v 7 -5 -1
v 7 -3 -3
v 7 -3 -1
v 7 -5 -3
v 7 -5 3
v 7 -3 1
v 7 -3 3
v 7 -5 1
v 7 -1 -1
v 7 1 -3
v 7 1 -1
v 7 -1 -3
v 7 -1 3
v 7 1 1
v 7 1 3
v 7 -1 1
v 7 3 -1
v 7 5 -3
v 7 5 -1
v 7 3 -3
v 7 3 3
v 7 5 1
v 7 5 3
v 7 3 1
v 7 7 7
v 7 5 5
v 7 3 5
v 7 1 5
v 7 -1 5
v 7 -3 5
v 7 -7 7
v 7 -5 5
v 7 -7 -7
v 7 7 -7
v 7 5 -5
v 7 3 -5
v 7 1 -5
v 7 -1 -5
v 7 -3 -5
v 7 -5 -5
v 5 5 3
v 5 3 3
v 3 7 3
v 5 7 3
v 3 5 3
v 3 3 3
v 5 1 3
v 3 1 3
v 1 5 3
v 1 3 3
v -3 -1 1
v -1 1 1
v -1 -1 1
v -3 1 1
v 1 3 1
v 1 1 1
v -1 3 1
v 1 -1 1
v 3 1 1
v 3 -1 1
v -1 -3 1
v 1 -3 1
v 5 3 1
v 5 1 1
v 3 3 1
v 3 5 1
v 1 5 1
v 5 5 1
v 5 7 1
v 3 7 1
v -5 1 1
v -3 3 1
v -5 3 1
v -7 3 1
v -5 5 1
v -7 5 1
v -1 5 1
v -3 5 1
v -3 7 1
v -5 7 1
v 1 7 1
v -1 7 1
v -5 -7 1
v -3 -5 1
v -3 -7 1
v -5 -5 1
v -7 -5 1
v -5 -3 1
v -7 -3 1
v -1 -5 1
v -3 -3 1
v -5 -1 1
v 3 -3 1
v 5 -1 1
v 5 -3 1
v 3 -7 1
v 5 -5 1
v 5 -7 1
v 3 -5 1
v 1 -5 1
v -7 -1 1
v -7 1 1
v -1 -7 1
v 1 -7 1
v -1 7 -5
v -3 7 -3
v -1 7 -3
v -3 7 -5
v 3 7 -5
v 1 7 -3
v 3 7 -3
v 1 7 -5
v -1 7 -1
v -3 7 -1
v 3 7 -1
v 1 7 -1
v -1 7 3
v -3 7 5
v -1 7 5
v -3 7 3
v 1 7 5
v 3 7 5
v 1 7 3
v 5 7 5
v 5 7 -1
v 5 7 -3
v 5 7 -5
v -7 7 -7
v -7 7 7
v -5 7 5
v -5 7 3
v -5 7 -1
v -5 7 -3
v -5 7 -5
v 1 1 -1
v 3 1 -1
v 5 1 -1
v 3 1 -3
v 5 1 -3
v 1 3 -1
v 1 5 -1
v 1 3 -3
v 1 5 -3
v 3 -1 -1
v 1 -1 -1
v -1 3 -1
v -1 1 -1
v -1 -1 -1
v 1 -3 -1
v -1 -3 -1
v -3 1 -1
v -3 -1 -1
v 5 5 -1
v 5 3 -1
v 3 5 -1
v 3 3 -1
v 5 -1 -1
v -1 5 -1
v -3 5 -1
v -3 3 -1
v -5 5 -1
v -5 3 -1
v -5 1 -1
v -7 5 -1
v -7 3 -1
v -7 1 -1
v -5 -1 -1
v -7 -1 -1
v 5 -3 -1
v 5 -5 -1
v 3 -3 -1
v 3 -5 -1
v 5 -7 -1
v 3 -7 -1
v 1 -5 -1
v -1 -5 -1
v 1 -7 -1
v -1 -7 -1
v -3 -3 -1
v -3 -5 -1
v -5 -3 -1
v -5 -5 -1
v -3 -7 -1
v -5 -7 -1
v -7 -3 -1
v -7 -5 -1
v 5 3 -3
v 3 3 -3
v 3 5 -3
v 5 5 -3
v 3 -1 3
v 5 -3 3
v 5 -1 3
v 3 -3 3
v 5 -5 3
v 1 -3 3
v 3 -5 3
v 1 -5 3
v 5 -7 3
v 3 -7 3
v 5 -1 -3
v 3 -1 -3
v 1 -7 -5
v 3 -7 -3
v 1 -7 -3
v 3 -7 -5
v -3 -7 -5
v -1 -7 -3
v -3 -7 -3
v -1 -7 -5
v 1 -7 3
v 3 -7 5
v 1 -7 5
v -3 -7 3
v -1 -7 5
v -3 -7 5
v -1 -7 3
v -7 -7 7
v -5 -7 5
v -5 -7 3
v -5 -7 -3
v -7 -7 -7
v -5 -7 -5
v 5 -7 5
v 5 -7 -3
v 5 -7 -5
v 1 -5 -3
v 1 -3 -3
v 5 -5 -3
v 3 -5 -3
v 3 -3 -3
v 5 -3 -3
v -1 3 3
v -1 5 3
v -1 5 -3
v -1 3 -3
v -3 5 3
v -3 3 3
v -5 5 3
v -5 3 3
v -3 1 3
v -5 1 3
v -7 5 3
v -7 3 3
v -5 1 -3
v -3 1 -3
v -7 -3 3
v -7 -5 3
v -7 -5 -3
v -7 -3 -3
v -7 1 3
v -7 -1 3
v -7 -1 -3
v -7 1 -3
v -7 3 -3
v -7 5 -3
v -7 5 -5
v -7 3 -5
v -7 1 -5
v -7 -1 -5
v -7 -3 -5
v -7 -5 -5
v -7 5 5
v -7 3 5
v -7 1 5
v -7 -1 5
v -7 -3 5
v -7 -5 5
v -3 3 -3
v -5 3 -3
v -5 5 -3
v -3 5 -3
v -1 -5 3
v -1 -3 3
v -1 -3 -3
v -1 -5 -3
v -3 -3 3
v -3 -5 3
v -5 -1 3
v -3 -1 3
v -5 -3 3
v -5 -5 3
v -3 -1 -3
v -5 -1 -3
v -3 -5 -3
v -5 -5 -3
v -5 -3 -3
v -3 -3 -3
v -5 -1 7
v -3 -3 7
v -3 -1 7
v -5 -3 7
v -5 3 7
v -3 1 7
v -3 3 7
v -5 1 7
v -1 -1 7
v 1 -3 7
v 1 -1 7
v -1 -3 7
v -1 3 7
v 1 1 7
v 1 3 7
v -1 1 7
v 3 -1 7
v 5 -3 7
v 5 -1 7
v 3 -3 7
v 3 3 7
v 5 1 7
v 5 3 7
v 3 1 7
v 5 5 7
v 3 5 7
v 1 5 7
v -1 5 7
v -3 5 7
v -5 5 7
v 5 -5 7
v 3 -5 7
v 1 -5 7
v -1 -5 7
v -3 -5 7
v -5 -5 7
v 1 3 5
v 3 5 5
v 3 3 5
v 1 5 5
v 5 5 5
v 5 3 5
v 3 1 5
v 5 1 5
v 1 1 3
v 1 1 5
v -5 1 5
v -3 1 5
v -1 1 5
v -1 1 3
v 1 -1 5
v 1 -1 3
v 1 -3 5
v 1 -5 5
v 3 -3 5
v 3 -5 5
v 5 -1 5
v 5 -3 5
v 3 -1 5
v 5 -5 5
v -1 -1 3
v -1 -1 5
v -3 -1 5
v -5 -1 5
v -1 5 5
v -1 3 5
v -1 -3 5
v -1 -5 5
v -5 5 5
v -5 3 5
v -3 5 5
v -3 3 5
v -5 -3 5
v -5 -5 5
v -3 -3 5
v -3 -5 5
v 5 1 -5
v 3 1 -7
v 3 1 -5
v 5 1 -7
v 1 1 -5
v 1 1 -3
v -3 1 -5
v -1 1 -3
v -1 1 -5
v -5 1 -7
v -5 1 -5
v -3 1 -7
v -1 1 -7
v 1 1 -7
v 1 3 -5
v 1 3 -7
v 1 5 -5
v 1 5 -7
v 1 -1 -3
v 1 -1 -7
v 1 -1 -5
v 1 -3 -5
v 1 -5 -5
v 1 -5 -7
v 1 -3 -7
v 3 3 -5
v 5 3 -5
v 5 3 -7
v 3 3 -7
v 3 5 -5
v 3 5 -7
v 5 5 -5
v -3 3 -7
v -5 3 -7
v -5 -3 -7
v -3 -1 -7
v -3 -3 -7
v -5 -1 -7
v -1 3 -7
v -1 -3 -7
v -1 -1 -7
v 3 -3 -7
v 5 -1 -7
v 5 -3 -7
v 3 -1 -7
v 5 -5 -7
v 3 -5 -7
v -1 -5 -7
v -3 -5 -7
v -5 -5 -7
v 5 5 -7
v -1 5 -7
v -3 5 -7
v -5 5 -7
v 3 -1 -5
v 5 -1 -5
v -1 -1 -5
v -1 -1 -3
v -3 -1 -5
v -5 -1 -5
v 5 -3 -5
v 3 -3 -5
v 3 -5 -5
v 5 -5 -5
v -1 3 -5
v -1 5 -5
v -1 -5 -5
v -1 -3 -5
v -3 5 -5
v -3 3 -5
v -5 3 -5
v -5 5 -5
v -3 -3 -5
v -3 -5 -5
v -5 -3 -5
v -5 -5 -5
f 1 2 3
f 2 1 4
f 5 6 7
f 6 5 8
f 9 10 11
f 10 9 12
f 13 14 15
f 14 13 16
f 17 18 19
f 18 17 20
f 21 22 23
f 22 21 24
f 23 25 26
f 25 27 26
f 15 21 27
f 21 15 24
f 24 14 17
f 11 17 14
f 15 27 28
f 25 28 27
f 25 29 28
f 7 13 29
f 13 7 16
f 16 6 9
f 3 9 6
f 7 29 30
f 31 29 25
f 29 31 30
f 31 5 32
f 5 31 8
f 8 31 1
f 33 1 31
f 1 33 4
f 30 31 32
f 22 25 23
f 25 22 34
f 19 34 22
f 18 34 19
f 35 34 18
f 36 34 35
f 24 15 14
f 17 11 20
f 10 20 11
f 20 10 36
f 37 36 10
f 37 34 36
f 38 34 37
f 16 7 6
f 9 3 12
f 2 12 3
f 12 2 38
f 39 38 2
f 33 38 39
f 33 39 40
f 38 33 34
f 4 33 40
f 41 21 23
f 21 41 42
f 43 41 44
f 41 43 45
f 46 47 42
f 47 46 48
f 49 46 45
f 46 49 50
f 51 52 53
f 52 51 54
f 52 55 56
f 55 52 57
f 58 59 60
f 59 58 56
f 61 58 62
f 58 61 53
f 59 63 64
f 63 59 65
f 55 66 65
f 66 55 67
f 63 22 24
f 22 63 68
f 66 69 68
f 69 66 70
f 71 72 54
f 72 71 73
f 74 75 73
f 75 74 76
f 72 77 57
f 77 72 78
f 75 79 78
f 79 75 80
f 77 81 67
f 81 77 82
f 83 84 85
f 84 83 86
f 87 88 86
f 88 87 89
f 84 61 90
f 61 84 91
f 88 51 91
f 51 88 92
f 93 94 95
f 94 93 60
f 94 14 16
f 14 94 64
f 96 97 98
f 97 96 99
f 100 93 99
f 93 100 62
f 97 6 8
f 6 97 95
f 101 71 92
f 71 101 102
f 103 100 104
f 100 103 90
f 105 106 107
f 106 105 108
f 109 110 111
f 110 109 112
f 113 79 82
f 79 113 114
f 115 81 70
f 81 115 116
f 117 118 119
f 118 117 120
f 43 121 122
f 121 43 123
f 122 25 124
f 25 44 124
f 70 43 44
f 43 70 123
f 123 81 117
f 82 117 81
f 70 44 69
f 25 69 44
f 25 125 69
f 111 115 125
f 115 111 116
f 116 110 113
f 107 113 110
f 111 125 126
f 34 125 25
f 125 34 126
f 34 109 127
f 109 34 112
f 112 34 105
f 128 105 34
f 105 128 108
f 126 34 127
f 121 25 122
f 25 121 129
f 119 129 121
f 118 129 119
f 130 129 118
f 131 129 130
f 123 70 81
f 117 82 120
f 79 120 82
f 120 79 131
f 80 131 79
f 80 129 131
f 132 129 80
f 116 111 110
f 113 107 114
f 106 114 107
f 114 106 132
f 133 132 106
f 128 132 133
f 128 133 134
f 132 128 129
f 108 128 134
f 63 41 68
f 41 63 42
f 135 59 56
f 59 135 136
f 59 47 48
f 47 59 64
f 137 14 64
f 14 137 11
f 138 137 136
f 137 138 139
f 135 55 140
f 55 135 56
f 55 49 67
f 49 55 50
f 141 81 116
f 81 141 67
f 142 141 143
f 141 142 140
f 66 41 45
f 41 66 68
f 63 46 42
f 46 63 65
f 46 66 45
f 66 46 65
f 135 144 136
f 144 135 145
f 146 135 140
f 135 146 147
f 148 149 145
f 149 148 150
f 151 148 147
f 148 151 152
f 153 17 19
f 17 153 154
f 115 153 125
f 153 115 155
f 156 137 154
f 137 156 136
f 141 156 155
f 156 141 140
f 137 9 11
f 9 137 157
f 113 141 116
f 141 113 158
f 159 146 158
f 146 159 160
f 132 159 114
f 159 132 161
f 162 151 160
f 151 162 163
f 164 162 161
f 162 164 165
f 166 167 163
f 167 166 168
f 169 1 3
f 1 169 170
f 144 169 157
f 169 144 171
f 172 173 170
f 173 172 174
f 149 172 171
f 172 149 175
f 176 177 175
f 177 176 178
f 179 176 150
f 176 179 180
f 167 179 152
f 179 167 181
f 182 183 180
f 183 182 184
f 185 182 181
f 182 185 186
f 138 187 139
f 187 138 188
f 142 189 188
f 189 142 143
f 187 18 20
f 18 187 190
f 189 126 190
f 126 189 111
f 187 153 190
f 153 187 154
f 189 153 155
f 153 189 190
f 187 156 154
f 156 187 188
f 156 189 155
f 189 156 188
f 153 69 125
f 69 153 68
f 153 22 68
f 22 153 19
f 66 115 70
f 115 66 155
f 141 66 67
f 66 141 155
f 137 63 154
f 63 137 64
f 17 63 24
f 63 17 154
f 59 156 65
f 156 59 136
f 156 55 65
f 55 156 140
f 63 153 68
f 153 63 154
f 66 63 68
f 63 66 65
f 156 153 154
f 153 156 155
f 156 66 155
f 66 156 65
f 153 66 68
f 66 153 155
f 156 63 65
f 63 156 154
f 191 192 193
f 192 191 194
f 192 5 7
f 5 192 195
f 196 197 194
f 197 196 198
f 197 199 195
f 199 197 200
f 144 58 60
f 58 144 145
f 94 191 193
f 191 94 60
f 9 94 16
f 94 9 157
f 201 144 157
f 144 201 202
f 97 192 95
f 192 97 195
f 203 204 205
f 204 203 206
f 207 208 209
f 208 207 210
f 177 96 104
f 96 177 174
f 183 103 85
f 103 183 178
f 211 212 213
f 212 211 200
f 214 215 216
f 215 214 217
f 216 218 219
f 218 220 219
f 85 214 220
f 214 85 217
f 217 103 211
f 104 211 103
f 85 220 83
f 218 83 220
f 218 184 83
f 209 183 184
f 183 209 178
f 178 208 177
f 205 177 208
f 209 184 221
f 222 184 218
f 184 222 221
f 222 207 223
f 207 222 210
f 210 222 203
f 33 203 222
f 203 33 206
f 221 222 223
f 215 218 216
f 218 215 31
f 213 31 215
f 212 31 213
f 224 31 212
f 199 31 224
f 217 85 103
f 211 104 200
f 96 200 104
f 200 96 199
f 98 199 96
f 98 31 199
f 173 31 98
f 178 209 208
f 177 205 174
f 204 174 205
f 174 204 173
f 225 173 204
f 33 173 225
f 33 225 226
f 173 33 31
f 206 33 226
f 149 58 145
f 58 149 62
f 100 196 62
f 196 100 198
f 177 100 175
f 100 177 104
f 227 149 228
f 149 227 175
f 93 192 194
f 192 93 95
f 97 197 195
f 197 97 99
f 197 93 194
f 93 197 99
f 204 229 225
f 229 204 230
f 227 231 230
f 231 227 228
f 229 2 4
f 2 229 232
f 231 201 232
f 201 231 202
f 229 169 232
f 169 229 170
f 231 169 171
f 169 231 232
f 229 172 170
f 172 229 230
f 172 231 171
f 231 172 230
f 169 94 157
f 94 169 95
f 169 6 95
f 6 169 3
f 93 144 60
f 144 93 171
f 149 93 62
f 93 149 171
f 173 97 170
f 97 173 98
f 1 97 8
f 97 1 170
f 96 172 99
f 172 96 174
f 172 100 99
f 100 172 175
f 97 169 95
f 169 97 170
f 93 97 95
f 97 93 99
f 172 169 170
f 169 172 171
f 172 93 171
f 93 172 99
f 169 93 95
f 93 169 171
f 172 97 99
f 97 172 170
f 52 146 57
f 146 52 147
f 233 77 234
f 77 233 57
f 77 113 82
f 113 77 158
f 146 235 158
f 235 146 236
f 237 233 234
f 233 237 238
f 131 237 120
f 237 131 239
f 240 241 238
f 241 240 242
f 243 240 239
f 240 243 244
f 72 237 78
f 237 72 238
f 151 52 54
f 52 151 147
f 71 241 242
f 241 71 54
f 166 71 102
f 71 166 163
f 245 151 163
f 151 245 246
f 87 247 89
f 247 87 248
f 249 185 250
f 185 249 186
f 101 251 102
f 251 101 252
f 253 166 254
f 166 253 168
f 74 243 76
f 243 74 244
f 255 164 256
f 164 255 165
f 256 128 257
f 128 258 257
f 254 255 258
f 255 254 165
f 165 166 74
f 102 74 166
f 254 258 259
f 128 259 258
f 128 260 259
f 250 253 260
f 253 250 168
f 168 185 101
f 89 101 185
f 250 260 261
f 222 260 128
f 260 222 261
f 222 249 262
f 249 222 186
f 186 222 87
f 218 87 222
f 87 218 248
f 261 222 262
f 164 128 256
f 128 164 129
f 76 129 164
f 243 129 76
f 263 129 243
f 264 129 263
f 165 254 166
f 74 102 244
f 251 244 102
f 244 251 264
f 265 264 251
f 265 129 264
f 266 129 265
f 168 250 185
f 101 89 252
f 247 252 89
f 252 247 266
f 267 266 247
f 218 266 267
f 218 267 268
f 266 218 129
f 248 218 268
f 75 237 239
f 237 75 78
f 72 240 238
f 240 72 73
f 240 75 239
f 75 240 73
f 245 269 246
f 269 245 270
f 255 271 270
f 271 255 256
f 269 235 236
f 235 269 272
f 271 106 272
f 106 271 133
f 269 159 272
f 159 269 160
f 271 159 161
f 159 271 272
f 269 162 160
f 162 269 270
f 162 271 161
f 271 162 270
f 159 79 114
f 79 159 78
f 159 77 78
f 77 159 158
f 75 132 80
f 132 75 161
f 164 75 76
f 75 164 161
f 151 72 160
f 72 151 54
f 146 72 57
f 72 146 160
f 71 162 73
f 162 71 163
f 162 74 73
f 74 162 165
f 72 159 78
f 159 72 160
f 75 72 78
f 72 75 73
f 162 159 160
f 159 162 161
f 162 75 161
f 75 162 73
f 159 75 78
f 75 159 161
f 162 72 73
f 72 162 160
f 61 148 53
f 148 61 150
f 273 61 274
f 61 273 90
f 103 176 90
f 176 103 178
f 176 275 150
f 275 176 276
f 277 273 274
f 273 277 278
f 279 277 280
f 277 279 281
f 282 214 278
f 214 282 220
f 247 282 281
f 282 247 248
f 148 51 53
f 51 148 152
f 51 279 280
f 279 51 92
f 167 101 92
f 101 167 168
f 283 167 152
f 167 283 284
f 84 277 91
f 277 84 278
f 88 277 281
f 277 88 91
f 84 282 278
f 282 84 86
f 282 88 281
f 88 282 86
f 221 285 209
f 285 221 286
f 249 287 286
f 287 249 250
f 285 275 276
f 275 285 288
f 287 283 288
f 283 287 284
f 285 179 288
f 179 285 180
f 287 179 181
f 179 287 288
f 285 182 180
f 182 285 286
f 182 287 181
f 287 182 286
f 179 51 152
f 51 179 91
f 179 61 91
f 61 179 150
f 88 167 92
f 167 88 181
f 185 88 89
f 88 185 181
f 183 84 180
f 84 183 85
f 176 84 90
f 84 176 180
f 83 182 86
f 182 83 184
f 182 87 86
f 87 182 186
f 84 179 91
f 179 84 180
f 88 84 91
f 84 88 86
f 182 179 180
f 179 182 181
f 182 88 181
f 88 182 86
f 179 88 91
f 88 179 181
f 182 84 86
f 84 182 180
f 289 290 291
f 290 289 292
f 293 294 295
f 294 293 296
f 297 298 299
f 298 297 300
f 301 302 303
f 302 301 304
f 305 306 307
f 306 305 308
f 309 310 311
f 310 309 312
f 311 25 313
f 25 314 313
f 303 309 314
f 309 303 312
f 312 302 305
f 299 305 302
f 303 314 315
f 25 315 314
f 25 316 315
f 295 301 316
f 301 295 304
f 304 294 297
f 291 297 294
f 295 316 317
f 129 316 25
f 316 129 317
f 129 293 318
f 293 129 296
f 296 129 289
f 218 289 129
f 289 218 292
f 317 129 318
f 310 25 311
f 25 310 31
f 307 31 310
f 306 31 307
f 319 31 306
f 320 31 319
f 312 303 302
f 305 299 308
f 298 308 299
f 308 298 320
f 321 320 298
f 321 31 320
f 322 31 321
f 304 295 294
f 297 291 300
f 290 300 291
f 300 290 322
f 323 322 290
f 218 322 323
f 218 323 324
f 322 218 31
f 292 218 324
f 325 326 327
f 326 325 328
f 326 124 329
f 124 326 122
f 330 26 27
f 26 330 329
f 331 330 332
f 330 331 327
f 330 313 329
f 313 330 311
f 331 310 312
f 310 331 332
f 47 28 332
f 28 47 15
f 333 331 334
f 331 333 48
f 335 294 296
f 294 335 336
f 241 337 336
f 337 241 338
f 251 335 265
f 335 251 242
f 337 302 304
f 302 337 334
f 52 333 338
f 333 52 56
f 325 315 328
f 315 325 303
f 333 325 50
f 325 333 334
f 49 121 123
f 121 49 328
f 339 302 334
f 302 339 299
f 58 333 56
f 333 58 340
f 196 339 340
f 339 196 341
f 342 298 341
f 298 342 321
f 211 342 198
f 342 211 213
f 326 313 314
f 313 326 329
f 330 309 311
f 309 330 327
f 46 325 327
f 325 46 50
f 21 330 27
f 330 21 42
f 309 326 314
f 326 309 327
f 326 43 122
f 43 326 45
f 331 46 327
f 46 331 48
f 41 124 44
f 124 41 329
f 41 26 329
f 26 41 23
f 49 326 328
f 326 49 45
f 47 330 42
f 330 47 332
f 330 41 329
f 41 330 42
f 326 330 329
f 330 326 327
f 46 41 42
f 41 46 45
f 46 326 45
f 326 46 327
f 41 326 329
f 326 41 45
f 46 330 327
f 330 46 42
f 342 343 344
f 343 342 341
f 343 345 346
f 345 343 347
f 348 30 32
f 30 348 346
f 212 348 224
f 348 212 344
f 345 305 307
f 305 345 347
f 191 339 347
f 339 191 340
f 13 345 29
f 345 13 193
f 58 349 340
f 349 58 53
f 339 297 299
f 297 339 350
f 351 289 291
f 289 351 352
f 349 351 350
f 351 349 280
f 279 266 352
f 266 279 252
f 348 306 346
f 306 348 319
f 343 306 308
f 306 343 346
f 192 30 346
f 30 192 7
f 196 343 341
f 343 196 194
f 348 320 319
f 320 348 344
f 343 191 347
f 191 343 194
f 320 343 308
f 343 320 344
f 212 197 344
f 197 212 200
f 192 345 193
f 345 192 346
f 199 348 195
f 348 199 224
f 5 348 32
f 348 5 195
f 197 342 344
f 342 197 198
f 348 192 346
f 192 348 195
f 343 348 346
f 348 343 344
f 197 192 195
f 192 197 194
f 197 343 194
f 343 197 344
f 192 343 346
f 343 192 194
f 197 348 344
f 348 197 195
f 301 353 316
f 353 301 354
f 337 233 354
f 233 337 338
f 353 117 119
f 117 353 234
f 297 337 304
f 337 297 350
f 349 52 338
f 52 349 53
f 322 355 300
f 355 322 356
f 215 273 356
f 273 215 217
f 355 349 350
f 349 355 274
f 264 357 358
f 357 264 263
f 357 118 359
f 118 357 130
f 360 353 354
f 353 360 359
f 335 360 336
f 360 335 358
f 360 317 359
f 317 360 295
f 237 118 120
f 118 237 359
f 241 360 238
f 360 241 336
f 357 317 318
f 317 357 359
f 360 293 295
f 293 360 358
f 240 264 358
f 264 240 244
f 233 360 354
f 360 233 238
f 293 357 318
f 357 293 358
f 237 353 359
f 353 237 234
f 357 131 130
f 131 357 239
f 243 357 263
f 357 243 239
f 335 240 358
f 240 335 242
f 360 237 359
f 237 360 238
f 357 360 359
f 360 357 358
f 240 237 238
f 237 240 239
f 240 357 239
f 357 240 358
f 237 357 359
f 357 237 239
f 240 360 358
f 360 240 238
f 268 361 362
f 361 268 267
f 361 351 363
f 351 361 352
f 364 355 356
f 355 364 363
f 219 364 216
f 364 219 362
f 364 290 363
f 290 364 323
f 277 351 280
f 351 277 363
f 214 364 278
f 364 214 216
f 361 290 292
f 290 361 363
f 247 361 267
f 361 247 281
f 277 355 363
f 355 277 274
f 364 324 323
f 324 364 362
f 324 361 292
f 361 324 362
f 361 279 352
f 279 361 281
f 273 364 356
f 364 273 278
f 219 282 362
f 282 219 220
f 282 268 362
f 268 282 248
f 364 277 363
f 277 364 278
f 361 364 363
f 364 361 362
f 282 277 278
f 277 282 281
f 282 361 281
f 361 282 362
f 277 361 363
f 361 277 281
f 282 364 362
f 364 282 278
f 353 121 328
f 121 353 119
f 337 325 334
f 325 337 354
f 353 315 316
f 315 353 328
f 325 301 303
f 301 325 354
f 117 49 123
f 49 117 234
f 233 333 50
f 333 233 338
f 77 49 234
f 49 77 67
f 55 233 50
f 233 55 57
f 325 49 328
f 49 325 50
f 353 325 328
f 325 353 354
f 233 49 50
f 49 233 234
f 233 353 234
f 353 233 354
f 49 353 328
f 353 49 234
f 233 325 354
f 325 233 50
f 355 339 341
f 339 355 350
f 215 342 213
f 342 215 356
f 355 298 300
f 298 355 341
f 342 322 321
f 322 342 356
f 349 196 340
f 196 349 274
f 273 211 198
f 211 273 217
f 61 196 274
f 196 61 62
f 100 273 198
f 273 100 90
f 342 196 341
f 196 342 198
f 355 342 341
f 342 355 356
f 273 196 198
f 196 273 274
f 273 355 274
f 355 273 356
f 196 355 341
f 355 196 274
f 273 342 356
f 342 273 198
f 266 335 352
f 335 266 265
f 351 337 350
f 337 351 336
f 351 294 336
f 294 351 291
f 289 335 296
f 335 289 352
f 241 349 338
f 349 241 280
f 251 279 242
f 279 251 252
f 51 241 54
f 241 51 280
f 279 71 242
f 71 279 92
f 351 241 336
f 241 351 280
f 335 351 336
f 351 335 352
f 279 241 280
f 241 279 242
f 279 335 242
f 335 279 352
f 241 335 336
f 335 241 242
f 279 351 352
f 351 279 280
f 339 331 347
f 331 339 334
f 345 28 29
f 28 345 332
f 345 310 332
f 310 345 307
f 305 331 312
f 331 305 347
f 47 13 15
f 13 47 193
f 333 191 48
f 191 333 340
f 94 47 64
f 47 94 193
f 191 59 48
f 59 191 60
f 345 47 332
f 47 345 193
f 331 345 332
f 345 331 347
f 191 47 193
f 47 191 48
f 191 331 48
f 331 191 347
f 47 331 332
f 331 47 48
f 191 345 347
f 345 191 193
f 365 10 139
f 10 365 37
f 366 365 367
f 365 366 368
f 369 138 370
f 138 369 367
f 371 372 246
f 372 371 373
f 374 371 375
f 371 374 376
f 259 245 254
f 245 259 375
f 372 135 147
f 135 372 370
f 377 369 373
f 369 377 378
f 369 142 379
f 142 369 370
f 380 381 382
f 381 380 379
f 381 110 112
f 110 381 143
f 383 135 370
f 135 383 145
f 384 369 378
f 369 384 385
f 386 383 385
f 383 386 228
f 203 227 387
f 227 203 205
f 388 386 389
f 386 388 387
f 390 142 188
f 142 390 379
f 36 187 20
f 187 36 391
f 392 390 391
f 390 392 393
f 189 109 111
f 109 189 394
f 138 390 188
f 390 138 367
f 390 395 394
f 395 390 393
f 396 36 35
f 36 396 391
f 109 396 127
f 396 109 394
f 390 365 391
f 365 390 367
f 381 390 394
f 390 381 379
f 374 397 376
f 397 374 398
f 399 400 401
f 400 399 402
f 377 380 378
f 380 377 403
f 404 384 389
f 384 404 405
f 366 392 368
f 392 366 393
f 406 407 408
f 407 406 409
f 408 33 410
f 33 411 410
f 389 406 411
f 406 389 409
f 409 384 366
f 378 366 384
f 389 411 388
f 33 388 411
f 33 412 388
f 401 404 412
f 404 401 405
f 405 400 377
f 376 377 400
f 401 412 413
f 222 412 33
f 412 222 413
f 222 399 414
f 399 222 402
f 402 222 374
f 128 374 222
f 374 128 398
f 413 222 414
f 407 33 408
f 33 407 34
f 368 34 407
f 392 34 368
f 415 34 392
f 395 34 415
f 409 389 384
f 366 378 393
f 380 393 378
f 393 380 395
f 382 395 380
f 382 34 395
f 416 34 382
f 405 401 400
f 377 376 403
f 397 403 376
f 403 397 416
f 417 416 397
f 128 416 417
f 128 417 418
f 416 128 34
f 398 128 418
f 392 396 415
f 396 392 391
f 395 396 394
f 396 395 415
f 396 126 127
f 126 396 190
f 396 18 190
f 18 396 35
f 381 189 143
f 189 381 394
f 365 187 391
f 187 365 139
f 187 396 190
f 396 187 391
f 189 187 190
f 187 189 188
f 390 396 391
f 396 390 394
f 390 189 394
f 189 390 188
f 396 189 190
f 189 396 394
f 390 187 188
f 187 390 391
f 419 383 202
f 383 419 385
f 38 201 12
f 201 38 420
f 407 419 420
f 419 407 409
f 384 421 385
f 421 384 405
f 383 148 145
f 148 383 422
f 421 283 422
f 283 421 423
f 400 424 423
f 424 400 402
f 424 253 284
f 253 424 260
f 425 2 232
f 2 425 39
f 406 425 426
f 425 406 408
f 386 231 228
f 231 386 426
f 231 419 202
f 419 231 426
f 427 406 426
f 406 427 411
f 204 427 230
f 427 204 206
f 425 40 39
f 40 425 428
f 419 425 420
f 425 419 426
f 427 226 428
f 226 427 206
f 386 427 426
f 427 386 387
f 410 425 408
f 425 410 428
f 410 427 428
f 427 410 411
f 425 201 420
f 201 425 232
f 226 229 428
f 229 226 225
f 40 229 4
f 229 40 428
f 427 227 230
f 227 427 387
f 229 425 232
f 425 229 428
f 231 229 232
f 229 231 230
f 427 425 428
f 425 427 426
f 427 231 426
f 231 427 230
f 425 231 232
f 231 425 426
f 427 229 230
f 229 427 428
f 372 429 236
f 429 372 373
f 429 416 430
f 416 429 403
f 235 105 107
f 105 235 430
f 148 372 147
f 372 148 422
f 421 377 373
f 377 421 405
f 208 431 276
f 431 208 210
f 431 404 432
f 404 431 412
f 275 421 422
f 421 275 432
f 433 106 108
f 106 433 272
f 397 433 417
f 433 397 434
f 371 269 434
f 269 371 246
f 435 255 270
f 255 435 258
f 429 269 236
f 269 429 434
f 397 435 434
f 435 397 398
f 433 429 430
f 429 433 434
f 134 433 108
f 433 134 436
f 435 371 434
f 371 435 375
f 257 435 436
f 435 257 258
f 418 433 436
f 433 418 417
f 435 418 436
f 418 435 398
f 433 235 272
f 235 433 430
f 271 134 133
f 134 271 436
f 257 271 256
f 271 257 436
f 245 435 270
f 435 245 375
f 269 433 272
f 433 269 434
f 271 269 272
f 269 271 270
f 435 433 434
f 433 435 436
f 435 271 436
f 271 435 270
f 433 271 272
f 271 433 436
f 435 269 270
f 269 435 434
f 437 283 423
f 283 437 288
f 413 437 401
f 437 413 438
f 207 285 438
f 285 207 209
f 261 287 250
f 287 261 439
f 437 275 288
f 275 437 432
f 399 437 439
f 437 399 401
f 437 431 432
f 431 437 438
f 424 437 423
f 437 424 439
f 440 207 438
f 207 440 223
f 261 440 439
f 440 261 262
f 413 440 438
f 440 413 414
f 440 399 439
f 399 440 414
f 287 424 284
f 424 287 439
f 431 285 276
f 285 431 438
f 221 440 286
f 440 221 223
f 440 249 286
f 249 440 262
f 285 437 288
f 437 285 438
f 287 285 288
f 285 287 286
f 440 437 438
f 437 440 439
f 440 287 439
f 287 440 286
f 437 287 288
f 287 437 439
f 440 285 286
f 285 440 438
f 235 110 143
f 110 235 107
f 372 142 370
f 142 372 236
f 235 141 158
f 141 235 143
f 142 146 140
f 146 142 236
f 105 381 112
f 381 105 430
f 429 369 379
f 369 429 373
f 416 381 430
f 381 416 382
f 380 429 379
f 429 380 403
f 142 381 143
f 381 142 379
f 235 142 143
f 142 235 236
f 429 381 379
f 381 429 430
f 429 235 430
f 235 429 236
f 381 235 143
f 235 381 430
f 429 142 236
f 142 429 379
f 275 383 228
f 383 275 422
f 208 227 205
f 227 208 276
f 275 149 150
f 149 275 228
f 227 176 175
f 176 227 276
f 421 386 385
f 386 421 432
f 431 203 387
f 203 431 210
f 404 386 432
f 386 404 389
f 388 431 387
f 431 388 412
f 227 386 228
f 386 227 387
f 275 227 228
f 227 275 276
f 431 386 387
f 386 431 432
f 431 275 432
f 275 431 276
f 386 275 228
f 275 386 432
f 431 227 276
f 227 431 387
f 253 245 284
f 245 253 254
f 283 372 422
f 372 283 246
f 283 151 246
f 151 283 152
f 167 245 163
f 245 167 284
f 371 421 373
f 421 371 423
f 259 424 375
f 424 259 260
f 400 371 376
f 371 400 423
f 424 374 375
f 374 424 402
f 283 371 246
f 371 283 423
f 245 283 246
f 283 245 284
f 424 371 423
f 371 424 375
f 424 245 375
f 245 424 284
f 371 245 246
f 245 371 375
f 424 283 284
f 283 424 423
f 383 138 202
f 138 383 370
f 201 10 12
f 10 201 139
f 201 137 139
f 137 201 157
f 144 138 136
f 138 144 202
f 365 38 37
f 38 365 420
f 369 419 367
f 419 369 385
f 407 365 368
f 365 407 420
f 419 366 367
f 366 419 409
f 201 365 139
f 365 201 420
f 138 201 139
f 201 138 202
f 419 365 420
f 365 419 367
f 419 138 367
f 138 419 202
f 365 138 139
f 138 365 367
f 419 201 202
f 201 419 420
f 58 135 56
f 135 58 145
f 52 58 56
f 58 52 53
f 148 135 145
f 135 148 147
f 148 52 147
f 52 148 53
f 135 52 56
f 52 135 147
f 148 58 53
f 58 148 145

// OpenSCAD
/***************************************************
Sierpinski Generator
By Adam Anderson 

Iteratively creates the Sierpinski Octahedron using any 
starting 3D shape.
***************************************************/

//What would you like the starting shape to be?
shape = "Cube"; //["Sphere":Sphere, "Cube":Cube]

side_length = 8;

//Controls the size of seed shapes
overlap = 1; //[0.5:0.5:10]

iterations = 3; //[1:8]

/* Useful_length scales the input length depending on the number
* of iterations so that the final geometry will occupy roughly the same
* volume regardless of the number of iterations.
*/
useful_length = side_length / pow(2, iterations - 1);

if(shape == "Cube") {
    Sierpinski(side_length, iterations) {
        cube(useful_length, center = true);
    }
}
else if(shape == "Sphere") {
    Sierpinski(side_length, iterations) {
        sphere(useful_length);
    }
}

module iterate(inputSize = 10) {
    size = inputSize / 2;
    /* TOP VERTICES */
    translate([0, 0, size]) {
        translate([size, size, 0]) children(0);
        translate([size, -size, 0]) children(0);
        translate([-size, size, 0]) children(0);
        translate([-size, -size, 0]) children(0);
        translate([0, size, 0]) children(0);
        translate([0, -size, 0]) children(0);
        translate([-size, 0, 0]) children(0);
        translate([size, 0, 0]) children(0);
    }
    /* EQUATORIAL VERTICES */
    translate([size, size, 0]) children(0);
    translate([-size, size, 0]) children(0);
    translate([size, -size, 0]) children(0);
    translate([-size, -size, 0]) children(0);
    
    /* BOTTOM VERTICES */
    translate([0, 0, -size]) {
        translate([size, size, 0]) children(0);
        translate([size, -size, 0]) children(0);
        translate([-size, size, 0]) children(0);
        translate([-size, -size, 0]) children(0);
        translate([0, size, 0]) children(0);
        translate([0, -size, 0]) children(0);
        translate([-size, 0, 0]) children(0);
        translate([size, 0, 0]) children(0);
    }
}

/********************************************
Octahedron.scad
By Adam Anderson

Provides a module for creating an octahedron
********************************************/

module octahedron(size = 4) {
    polyhedron(
        points = [ 
            [0,0, size], //0
            [0, size, 0], //1
            [size, 0, 0], //2
            [0, 0, -size], //3
            [0, -size, 0], //4
            [-size, 0, 0] //5
        ],
        faces = [
            [0, 1, 2],
            [0, 2, 4],
            [0, 4, 5],
            [0, 5, 1],
            [3, 1, 2],
            [3, 4, 2],
            [3, 5, 4],
            [3, 1, 5]
        ]
    );
}

/*
* Uses input shape to create Sierpinski Tetrix by scaling
* and translating duplicates of the original shape.
* See the iterate module for specific translation amounts.
*/
module Sierpinski(side = 10, iterations = 5) {
    if(iterations > 0) {
        iterate(side) {
            Sierpinski(side / 2, iterations - 1) {
                children(0);
            }
        }
        scale(overlap) children(0);
    }
}
